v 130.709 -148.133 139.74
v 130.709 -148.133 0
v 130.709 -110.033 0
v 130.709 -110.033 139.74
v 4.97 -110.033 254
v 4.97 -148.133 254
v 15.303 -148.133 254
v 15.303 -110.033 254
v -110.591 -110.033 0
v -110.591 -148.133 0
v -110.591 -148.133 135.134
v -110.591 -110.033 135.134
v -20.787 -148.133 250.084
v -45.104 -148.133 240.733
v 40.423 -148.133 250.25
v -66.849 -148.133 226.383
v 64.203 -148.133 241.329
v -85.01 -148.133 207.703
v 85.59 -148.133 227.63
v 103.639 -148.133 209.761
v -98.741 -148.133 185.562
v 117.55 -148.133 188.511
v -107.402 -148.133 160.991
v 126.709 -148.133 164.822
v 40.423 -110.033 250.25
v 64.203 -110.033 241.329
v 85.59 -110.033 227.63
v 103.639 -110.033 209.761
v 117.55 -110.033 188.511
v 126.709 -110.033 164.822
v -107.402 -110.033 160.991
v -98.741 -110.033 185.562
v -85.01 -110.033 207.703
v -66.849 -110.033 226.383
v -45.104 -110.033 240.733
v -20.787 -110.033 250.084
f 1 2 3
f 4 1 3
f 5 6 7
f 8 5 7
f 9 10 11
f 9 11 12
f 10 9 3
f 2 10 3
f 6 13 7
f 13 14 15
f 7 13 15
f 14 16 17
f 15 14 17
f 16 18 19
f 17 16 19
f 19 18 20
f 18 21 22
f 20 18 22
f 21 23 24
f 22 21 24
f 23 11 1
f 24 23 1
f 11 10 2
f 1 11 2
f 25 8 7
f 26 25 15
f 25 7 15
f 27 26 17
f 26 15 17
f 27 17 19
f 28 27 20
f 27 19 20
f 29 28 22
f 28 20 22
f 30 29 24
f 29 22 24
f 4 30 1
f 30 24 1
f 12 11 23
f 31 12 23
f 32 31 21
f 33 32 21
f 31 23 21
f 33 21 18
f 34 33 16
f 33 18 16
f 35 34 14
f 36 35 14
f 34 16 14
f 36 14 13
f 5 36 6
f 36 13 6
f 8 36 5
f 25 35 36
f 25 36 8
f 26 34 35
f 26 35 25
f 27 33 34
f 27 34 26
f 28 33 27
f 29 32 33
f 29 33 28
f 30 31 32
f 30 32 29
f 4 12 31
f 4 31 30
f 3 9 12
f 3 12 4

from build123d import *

# Parameters (mm, degrees)
F0_W     = 241.3
F0_H     = 38.1
F1_DEPTH = 254
F3_DEPTH = 38.1


with BuildPart() as f1:
    # F0 (on Top) → F1 (new body)
    with BuildSketch(Plane.XY):
        with Locations((10.0588537753, -129.0830521395)):
            Rectangle(F0_W, F0_H)
    extrude(amount=F1_DEPTH)

    # F2 (on face) → F3 (cut)
    with BuildSketch(Plane.XZ.offset(148.1330521395)):
        with BuildLine():
            ThreePointArc((15.302500107, 254), (95.0856852325, 219.171604803), (130.7088537753, 139.7401022129))
            Line((130.7088537753, 139.7401022129), (130.7088537753, 254))
            Line((130.7088537753, 254), (15.302500107, 254))
        make_face()
        with BuildLine():
            ThreePointArc((-110.5911462247, 135.133523386), (-76.4349382663, 217.5345320826), (4.9704818596, 254))
            Line((4.9704818596, 254), (-110.5911462247, 254))
            Line((-110.5911462247, 254), (-110.5911462247, 135.133523386))
        make_face()
    extrude(amount=-F3_DEPTH, mode=Mode.SUBTRACT)


solid = f1.part
